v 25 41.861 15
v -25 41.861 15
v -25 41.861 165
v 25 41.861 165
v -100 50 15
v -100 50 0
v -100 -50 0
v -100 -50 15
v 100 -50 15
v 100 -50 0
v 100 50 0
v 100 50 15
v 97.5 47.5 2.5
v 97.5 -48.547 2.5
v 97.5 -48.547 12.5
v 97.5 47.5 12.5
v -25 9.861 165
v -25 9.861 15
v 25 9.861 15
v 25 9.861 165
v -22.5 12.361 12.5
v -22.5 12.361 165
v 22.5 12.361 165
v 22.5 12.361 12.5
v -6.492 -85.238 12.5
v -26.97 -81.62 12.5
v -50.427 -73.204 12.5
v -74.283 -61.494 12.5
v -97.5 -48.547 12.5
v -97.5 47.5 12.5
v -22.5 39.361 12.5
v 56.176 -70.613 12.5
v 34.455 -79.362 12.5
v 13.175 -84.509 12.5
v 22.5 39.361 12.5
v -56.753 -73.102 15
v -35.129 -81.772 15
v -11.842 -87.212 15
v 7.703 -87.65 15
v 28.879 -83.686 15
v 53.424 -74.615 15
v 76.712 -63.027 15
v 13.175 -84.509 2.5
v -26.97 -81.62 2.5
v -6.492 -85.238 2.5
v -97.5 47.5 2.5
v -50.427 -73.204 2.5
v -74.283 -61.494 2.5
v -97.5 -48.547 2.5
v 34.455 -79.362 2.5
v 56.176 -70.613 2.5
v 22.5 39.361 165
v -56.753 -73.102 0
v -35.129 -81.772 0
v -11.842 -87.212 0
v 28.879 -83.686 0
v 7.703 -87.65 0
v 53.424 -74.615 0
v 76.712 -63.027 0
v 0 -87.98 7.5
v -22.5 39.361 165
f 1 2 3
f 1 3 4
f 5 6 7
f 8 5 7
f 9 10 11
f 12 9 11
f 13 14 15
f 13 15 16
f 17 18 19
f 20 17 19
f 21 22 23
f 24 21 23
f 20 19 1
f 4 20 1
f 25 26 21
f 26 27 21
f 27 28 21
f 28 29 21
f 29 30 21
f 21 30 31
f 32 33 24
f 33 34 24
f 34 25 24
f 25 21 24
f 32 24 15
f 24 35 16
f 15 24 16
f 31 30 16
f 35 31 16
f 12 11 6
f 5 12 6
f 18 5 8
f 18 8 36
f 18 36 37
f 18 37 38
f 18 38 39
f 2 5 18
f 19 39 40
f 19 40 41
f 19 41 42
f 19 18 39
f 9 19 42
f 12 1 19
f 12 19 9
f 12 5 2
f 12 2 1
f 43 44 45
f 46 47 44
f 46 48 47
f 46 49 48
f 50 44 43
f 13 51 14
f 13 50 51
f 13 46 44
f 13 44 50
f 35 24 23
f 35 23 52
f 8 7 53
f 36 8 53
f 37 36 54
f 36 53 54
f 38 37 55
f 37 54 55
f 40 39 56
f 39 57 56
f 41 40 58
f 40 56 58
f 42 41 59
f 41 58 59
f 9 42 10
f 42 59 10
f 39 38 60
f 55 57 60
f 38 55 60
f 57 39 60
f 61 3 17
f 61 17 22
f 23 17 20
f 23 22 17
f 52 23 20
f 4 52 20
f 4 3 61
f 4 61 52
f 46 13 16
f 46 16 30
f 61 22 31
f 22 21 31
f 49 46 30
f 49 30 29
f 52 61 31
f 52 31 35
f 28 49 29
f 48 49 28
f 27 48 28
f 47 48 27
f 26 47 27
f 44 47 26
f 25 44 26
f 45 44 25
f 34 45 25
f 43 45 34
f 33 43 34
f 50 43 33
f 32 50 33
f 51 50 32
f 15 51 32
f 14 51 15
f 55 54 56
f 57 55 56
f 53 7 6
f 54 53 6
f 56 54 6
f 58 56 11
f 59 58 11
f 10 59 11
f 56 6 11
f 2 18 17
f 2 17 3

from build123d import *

# Parameters (mm, degrees)
F1_DEPTH = 15
F2_W     = 50
F2_H     = 32
F3_DEPTH = 150
F4_T     = -2.5


with BuildPart() as f1:
    # F0 (on Top) → F1 (new body)
    with BuildSketch(Plane.XY):
        with BuildLine():
            Line((100, 50), (-100, 50))
            Line((-100, 50), (-100, -50))
            add(Edge.make_bspline(
                [(-100, -50), (-66.6666666667, -68.9898259938), (0, -106.9694779813), (66.6666666667, -68.9898259938), (100, -50)],
                knots=[0, 0, 0, 0, 0.5, 1, 1, 1, 1], degree=3))
            Line((100, -50), (100, 50))
        make_face()
    extrude(amount=F1_DEPTH)

    # F2 (on face) → F3 (join)
    with BuildSketch(Plane.XY.offset(15)):
        with Locations((0, 25.8605617276)):
            Rectangle(F2_W, F2_H)
    extrude(amount=F3_DEPTH)

    # F4
    f4_openings = [f1.faces().sort_by_distance(p)[0] for p in [
        (0, 25.860562, 165),
    ]]
    offset(amount=F4_T, openings=f4_openings, kind=Kind.INTERSECTION)


solid = f1.part
